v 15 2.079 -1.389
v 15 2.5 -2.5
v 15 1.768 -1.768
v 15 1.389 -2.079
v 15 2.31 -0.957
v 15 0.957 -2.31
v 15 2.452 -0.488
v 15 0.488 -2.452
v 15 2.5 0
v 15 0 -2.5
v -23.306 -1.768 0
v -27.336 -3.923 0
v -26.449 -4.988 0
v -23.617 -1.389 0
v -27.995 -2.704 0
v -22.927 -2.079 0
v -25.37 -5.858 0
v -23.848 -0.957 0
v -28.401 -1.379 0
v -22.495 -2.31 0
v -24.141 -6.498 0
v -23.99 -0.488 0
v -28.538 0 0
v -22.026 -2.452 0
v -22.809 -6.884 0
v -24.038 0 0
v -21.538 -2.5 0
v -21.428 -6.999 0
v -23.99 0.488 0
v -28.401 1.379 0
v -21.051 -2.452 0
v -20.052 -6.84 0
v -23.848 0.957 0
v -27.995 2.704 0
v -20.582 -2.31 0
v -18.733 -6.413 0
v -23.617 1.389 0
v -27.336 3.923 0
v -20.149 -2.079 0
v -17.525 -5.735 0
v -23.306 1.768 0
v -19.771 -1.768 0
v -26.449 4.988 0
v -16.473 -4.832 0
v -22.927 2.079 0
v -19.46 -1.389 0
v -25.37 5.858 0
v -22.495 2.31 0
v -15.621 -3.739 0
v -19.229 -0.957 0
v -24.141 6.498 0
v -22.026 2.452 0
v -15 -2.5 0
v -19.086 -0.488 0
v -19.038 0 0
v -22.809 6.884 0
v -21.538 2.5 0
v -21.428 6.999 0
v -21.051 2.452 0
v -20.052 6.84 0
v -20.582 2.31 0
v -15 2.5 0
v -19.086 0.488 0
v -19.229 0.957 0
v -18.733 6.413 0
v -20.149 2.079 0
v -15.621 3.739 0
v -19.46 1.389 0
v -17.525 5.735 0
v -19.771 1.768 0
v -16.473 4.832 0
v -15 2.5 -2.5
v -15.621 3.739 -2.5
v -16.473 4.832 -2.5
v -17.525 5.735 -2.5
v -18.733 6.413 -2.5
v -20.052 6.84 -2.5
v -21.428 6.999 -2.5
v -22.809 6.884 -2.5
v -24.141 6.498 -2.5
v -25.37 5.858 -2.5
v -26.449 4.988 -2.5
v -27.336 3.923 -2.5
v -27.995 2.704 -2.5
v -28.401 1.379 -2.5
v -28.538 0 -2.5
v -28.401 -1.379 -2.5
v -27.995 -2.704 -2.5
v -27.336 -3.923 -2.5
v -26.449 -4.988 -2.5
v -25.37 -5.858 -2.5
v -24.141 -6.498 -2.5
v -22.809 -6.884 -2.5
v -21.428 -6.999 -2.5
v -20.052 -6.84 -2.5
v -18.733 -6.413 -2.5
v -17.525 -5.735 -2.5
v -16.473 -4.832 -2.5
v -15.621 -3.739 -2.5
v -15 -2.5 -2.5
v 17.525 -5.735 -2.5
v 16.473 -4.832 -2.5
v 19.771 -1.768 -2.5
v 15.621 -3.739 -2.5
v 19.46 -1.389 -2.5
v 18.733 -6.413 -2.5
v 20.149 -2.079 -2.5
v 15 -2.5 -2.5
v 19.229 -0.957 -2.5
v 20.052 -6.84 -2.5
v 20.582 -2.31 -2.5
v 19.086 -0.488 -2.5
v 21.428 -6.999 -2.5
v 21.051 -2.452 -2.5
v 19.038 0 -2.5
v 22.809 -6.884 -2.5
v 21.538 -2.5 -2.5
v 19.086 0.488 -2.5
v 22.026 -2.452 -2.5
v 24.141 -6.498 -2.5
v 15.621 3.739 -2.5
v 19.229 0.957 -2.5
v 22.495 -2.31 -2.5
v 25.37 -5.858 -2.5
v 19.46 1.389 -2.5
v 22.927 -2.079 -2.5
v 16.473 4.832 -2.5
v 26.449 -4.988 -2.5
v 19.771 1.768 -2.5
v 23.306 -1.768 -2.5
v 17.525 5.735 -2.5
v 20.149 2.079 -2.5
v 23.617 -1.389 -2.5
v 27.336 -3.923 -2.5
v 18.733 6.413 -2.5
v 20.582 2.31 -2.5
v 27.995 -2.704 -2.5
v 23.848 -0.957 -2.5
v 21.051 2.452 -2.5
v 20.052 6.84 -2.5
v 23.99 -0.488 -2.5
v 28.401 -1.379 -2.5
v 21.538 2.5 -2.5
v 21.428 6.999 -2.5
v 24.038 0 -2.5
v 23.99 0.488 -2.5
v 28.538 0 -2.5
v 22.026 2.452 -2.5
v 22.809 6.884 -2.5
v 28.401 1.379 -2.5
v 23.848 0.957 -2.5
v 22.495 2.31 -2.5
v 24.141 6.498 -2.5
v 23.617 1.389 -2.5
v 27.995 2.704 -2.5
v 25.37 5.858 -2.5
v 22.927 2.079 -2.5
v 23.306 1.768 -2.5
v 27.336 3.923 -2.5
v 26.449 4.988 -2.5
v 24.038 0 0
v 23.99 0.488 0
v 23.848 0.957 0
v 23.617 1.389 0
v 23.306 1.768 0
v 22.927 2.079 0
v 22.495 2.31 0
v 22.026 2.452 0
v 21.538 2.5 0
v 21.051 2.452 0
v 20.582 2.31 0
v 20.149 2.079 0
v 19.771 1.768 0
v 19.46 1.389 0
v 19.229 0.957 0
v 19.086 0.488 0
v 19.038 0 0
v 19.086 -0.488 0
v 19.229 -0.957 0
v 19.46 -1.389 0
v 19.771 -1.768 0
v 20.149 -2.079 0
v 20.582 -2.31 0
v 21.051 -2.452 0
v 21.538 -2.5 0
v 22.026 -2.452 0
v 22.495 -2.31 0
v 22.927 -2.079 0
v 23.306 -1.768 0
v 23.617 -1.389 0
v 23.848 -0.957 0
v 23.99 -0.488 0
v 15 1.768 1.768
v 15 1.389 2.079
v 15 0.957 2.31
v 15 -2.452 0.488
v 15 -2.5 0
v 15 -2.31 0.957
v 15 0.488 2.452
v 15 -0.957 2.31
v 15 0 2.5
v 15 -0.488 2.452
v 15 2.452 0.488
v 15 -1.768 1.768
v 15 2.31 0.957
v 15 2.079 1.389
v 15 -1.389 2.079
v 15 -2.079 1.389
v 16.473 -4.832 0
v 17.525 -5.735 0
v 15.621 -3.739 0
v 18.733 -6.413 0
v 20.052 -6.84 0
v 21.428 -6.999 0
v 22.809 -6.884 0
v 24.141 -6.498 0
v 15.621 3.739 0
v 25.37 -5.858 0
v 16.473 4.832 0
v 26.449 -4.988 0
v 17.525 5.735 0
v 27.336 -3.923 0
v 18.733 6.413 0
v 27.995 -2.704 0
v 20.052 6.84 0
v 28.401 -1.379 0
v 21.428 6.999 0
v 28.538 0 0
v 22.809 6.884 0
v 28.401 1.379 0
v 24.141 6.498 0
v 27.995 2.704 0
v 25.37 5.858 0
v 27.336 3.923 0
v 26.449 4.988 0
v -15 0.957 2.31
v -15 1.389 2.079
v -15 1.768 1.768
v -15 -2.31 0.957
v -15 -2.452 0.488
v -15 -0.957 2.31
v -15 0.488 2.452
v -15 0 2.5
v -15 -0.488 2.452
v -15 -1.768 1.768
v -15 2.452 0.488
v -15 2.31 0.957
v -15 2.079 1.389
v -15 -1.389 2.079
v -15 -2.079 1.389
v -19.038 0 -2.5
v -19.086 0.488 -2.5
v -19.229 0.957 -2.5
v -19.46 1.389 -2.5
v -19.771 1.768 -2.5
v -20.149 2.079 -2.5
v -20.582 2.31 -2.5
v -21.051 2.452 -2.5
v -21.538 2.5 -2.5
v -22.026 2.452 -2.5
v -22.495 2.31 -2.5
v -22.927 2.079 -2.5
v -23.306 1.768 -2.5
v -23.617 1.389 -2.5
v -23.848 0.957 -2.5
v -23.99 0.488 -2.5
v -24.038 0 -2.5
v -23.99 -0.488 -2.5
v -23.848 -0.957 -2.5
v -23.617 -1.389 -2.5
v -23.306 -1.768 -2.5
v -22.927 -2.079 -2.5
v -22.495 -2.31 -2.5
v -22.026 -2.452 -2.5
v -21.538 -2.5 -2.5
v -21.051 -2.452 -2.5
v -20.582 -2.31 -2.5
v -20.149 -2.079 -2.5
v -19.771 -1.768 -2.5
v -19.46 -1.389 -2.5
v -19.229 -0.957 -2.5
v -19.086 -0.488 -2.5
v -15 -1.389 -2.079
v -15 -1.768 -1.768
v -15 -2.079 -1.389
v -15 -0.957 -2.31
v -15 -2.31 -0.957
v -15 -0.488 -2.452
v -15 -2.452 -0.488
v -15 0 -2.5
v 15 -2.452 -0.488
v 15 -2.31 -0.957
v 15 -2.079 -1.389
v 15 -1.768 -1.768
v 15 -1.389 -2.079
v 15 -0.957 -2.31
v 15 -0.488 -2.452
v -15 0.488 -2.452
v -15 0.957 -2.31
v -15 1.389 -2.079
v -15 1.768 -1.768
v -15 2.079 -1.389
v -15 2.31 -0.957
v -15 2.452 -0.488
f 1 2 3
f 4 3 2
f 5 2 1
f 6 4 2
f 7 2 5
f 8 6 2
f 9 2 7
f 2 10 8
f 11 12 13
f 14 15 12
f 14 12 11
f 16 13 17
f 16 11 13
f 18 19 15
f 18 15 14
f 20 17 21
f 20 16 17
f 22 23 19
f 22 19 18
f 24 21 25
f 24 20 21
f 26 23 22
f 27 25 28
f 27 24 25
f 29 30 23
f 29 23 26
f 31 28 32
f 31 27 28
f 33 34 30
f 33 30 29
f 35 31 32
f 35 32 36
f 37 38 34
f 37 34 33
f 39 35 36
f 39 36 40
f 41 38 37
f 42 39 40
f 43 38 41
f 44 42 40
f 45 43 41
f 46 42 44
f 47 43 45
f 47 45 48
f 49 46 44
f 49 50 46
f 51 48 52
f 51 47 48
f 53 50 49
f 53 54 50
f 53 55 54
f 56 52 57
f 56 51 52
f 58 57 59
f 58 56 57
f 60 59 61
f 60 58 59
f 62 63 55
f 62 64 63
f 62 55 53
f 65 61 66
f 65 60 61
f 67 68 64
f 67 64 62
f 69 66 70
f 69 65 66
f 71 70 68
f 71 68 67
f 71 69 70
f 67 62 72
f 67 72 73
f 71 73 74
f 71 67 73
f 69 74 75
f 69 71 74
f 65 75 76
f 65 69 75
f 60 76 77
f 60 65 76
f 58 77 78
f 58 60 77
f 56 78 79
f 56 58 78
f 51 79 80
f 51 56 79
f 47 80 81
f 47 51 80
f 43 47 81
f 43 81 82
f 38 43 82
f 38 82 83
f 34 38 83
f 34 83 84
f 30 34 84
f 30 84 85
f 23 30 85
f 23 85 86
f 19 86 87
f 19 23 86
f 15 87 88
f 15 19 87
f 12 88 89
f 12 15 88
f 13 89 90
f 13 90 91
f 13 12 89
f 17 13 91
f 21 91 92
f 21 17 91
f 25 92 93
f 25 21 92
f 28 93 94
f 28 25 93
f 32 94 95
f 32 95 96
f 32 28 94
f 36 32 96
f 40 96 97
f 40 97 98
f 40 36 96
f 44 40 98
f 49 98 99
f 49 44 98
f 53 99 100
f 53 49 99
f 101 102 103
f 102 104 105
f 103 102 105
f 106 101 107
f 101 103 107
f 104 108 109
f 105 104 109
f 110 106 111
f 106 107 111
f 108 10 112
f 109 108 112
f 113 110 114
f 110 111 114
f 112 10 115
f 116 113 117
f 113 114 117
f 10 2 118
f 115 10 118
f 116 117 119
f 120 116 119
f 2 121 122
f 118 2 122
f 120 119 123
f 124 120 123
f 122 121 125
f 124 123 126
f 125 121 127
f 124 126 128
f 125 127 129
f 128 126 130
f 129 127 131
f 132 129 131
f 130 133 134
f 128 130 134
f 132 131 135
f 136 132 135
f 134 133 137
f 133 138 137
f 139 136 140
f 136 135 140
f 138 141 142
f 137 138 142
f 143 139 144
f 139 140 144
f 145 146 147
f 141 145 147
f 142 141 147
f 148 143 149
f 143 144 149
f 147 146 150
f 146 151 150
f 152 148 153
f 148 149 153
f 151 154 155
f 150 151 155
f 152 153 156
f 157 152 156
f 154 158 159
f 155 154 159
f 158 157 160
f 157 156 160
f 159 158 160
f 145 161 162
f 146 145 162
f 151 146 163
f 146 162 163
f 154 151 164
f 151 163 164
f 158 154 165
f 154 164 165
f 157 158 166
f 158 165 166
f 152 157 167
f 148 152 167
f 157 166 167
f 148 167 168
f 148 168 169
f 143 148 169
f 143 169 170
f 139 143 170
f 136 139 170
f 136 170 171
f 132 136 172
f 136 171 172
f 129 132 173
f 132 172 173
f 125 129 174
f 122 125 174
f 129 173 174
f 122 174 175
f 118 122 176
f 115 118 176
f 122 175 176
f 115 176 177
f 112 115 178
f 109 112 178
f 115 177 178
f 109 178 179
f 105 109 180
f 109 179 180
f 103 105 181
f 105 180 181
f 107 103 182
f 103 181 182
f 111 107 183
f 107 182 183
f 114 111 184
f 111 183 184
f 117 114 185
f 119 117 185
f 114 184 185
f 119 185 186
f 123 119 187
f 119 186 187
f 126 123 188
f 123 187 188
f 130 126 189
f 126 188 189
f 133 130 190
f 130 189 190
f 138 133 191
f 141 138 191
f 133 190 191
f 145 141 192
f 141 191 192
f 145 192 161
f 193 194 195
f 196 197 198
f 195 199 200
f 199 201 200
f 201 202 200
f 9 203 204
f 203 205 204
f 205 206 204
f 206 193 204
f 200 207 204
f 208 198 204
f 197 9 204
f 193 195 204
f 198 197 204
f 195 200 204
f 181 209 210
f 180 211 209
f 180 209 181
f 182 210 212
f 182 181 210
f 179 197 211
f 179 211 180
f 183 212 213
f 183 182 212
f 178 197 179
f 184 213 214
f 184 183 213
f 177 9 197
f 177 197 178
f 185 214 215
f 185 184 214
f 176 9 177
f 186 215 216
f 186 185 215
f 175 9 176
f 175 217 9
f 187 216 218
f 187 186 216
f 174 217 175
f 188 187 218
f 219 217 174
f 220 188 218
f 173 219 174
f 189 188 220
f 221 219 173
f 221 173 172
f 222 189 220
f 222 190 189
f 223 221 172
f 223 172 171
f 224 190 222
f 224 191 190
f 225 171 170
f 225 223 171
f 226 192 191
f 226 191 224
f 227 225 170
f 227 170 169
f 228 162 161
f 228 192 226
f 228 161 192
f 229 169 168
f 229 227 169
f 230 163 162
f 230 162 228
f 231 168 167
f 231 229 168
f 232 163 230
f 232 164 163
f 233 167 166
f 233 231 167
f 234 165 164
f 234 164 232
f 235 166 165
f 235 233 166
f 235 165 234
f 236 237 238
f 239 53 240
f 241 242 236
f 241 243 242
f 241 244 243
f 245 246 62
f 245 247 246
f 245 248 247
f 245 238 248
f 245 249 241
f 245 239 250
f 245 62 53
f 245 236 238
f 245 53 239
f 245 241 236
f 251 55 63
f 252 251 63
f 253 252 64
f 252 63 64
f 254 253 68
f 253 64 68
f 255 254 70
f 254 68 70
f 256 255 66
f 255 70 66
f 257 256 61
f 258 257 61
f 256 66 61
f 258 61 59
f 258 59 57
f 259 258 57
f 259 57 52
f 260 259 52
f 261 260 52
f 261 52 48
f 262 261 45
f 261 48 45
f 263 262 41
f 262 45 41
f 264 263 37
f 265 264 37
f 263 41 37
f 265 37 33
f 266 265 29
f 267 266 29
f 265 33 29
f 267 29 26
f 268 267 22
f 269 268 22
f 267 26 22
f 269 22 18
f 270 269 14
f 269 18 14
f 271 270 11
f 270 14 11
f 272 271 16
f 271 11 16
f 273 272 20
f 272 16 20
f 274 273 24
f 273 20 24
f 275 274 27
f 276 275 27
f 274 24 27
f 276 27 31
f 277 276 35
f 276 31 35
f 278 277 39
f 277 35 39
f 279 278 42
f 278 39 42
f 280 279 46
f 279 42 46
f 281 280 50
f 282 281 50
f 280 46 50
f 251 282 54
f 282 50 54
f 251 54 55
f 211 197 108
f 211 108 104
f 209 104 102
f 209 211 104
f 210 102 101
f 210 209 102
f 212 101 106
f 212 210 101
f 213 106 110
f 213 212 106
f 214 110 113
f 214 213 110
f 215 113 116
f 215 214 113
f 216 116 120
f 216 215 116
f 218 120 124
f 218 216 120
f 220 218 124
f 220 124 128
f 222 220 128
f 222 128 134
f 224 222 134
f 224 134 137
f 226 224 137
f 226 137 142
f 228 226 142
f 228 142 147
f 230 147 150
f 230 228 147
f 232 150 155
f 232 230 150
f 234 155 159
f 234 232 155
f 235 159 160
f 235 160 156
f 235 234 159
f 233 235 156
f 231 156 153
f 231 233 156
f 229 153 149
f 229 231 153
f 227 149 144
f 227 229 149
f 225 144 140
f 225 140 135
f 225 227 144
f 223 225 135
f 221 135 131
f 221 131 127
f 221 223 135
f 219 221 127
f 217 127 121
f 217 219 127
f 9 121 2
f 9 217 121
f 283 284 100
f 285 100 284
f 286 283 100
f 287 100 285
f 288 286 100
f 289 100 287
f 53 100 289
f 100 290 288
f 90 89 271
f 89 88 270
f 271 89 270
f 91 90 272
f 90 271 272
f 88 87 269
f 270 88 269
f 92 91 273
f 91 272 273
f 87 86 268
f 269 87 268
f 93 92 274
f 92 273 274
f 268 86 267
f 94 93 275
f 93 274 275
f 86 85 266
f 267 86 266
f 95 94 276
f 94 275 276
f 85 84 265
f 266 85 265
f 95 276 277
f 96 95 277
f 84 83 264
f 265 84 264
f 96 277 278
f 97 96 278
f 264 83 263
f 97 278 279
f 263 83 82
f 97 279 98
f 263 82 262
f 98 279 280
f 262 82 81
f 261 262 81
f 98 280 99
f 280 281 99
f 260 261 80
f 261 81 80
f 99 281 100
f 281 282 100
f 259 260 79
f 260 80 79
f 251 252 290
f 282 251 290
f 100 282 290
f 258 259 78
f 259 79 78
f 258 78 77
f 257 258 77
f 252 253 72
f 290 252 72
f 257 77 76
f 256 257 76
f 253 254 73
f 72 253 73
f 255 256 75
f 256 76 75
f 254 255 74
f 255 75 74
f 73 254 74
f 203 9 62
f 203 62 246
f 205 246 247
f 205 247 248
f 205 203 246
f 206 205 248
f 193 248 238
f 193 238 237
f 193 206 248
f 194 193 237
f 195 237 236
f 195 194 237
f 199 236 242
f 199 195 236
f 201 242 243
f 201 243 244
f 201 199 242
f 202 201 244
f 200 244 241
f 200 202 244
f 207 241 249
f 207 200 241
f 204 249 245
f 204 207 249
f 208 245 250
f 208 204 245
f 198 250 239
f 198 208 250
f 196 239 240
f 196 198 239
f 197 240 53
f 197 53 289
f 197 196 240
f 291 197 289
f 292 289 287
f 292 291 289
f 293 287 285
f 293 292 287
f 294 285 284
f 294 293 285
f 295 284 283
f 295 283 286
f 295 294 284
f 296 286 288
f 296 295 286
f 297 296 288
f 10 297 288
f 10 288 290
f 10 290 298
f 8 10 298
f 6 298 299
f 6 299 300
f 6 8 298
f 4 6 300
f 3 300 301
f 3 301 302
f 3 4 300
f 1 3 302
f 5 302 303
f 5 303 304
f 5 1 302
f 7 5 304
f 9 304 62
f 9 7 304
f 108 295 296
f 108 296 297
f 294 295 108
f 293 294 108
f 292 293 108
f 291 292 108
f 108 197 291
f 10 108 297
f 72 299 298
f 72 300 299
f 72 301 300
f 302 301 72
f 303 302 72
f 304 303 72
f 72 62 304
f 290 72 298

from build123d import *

# Parameters (mm, degrees)
SKETCH1_W           = 30
SKETCH1_H           = 2.5
SKETCH3_R           = 2.5
BOSS_EXTRUDE2_DEPTH = 2.5


with BuildPart() as part:
    # Sketch1 → Revolve-Thin1 (revolve)
    with BuildSketch(Plane.XY):
        with Locations((0, 1.25)):
            Rectangle(SKETCH1_W, SKETCH1_H)
    revolve(axis=Axis((-15, 0, 0), (1, 0, 0)))

    # Sketch3 → Boss-Extrude2 (add)
    with BuildSketch(Plane.XY):
        with BuildLine():
            Line((15, 2.5), (15, -2.5))
            ThreePointArc((15, -2.5), (28.538348415, 0), (15, 2.5))
        make_face()
        with Locations((21.538348415, 0)):
            Circle(SKETCH3_R, mode=Mode.SUBTRACT)
        with BuildLine():
            Line((-15, -2.5), (-15, 2.5))
            ThreePointArc((-15, 2.5), (-28.538348415, 0), (-15, -2.5))
        make_face()
        with Locations((-21.538348415, 0)):
            Circle(SKETCH3_R, mode=Mode.SUBTRACT)
    extrude(amount=-BOSS_EXTRUDE2_DEPTH)


solid = part.part
